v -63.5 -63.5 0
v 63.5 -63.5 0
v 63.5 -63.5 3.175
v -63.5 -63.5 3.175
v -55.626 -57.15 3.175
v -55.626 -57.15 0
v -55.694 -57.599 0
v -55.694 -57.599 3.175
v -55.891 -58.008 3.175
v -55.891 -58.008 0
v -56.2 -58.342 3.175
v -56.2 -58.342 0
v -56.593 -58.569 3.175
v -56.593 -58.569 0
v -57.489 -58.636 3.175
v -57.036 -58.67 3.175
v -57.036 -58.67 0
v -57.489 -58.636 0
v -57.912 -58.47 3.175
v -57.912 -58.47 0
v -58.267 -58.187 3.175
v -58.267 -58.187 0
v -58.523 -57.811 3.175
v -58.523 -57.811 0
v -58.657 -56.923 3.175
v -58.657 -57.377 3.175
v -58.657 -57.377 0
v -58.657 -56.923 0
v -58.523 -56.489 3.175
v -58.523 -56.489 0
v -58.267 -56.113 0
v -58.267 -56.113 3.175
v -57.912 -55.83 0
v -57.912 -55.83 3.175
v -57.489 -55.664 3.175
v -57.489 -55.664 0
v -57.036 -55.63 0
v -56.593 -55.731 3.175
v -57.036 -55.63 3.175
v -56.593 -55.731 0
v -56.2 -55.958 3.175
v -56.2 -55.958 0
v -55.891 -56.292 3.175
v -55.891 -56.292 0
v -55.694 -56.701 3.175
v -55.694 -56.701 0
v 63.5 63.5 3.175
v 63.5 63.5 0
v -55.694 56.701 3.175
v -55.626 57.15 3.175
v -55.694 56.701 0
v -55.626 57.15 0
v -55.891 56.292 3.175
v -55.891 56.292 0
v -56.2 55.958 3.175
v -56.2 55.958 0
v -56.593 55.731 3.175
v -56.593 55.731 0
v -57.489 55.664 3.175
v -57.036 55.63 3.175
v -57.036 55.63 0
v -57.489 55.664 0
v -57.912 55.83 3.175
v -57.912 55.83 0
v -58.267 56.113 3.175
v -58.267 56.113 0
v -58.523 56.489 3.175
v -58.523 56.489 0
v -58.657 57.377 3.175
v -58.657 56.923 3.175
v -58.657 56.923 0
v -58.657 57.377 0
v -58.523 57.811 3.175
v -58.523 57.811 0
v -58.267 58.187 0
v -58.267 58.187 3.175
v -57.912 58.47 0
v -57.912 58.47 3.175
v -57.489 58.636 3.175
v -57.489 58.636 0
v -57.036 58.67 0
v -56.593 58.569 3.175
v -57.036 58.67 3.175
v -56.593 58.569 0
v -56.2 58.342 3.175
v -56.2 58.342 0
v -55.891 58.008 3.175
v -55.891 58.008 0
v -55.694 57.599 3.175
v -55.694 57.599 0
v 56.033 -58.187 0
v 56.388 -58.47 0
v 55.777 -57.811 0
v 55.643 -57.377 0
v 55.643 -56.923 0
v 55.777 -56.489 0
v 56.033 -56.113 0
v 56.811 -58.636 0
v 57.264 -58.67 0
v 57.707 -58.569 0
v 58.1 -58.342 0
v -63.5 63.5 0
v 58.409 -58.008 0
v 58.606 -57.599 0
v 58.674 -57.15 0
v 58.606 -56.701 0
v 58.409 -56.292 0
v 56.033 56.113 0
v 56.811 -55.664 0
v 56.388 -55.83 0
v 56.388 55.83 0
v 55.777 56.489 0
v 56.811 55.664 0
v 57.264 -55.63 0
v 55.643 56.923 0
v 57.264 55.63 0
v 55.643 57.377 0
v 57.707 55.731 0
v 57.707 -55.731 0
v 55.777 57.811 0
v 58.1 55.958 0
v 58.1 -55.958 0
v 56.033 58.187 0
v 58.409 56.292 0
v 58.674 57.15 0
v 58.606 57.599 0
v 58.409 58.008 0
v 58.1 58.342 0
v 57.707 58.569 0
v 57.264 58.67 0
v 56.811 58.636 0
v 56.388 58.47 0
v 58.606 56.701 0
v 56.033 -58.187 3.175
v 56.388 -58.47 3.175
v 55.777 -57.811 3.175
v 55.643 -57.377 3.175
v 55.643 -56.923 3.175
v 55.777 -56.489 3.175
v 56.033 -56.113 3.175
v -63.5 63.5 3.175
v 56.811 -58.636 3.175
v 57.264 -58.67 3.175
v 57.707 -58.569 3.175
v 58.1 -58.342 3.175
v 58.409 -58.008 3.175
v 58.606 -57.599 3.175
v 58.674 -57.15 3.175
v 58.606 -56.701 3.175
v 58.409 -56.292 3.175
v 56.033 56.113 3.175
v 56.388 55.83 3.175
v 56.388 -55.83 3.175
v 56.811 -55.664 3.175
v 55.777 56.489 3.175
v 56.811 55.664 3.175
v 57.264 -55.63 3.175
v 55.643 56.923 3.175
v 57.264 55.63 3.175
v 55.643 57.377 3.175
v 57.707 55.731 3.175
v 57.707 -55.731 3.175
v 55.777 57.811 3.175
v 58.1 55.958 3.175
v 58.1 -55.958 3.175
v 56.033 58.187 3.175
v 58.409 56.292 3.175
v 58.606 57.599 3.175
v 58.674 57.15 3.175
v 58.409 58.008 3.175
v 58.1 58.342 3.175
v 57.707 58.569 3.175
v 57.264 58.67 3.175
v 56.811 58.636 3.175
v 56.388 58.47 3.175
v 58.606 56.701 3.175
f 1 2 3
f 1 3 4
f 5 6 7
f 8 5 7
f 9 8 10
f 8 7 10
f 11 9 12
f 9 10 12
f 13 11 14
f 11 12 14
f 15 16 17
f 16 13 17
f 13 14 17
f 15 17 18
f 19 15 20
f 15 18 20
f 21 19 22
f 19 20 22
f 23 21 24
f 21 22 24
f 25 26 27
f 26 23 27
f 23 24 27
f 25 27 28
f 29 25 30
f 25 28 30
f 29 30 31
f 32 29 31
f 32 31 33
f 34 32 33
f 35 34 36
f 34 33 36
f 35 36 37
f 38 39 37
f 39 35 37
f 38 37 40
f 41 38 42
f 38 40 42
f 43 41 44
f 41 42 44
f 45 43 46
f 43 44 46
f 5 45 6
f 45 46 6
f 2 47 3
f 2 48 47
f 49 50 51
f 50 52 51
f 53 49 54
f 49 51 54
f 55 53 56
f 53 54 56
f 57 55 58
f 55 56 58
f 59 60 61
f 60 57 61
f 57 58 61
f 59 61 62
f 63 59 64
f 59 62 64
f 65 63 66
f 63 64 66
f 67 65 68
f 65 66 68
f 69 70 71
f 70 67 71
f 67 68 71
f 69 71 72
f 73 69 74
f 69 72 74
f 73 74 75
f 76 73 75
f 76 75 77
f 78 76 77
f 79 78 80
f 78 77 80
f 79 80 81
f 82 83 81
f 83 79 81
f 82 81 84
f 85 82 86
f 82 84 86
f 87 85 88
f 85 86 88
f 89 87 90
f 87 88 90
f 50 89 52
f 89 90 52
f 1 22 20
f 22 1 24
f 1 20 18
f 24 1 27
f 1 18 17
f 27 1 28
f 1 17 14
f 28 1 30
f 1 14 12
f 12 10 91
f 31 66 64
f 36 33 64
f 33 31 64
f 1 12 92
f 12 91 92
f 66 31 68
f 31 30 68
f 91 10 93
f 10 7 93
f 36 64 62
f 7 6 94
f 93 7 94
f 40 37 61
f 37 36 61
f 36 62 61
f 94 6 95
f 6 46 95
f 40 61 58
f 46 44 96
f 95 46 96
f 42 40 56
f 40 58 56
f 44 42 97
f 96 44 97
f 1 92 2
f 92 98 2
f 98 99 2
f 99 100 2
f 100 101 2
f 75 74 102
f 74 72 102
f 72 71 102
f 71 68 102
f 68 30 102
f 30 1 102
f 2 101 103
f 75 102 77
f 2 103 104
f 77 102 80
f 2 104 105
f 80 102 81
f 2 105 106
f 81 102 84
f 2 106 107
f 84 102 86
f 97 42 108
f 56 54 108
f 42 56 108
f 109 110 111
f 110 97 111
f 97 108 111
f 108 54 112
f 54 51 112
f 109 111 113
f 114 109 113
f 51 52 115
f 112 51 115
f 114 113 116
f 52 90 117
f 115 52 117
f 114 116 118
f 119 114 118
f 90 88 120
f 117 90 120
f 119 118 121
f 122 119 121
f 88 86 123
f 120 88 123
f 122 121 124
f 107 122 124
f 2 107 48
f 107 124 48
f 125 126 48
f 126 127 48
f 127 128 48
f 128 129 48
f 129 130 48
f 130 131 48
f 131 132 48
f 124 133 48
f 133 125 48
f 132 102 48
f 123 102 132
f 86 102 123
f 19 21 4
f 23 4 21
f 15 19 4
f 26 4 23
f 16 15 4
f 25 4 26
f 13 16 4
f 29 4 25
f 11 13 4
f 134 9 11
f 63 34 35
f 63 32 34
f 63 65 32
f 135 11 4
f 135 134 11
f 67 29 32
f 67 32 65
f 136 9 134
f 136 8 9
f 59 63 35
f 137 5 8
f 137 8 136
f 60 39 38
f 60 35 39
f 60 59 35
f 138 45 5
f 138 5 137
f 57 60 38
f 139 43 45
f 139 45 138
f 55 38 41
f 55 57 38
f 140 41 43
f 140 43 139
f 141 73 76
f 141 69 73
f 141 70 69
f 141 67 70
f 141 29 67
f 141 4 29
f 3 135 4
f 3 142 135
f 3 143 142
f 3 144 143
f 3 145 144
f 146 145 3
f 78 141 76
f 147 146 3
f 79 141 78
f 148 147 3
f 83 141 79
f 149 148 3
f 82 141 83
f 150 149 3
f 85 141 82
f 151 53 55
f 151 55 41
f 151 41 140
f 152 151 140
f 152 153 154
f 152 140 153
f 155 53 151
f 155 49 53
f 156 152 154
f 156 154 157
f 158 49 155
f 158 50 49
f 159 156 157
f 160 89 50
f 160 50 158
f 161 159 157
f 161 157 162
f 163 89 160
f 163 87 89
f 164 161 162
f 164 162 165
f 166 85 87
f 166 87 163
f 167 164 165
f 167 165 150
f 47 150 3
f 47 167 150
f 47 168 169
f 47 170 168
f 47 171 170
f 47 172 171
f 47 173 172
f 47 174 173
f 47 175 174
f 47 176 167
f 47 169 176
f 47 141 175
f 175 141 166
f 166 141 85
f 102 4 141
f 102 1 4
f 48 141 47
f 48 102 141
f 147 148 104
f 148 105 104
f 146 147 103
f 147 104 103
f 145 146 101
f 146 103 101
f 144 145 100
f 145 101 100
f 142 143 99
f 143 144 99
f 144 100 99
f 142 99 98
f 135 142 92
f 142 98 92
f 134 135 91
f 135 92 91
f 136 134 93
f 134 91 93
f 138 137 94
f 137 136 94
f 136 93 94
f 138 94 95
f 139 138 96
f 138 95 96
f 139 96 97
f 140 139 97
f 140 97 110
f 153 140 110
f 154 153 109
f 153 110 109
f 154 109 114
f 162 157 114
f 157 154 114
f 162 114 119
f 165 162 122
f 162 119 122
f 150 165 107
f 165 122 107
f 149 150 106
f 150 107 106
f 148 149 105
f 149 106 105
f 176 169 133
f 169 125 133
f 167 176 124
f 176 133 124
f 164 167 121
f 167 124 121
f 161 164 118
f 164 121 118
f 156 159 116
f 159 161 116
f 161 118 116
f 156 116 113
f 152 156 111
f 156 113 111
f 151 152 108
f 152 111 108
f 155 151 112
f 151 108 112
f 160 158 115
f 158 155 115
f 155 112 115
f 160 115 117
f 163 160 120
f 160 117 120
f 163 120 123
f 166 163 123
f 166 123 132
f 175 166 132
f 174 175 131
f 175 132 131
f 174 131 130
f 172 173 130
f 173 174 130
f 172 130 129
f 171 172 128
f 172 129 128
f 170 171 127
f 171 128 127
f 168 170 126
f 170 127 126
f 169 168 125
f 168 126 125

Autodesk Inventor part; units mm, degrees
ref_plane "YZ Plane" through (0, 0, 0) normal (1, 0, 0) x (0, 1, 0)
ref_plane "XZ Plane" through (0, 0, 0) normal (0, 1, 0) x (-1, 0, 0)
ref_plane "XY Plane" through (0, 0, 0) normal (0, 0, 1) x (1, 0, 0)
sketch "Sketch1" plane through (0, 0, 0) normal (0, 0, 1) x (1, 0, 0)
  line L0 (-63.5, 63.5) -> (63.5, 63.5)
  line L1 (63.5, 63.5) -> (63.5, -63.5)
  line L2 (63.5, -63.5) -> (-63.5, -63.5)
  line L3 (-63.5, -63.5) -> (-63.5, 63.5)
  circle A0 centre (-57.15, 57.15) radius 1.524
  circle A1 centre (57.15, 57.15) radius 1.524
  line L4 (63.5, 0) -> (-63.5, 0)
  circle A2 centre (-57.15, -57.15) radius 1.524
  circle A3 centre (57.15, -57.15) radius 1.524
  point P0 (0, 0)
  point P1 (0, 63.5)
  dimension "d0" = 127
  dimension "d1" = 127
  dimension "d2" = 127
  dimension "d3" = 3.048
  dimension "d4" = 3.048
  dimension "d5" = 6.35
  dimension "d6" = 6.35
  dimension "d7" = 6.35
  dimension "d8" = 6.35
extrude "Extrusion1" add sketch "Sketch1" along normal blind 3.175
properties part number "hank - base 1"
